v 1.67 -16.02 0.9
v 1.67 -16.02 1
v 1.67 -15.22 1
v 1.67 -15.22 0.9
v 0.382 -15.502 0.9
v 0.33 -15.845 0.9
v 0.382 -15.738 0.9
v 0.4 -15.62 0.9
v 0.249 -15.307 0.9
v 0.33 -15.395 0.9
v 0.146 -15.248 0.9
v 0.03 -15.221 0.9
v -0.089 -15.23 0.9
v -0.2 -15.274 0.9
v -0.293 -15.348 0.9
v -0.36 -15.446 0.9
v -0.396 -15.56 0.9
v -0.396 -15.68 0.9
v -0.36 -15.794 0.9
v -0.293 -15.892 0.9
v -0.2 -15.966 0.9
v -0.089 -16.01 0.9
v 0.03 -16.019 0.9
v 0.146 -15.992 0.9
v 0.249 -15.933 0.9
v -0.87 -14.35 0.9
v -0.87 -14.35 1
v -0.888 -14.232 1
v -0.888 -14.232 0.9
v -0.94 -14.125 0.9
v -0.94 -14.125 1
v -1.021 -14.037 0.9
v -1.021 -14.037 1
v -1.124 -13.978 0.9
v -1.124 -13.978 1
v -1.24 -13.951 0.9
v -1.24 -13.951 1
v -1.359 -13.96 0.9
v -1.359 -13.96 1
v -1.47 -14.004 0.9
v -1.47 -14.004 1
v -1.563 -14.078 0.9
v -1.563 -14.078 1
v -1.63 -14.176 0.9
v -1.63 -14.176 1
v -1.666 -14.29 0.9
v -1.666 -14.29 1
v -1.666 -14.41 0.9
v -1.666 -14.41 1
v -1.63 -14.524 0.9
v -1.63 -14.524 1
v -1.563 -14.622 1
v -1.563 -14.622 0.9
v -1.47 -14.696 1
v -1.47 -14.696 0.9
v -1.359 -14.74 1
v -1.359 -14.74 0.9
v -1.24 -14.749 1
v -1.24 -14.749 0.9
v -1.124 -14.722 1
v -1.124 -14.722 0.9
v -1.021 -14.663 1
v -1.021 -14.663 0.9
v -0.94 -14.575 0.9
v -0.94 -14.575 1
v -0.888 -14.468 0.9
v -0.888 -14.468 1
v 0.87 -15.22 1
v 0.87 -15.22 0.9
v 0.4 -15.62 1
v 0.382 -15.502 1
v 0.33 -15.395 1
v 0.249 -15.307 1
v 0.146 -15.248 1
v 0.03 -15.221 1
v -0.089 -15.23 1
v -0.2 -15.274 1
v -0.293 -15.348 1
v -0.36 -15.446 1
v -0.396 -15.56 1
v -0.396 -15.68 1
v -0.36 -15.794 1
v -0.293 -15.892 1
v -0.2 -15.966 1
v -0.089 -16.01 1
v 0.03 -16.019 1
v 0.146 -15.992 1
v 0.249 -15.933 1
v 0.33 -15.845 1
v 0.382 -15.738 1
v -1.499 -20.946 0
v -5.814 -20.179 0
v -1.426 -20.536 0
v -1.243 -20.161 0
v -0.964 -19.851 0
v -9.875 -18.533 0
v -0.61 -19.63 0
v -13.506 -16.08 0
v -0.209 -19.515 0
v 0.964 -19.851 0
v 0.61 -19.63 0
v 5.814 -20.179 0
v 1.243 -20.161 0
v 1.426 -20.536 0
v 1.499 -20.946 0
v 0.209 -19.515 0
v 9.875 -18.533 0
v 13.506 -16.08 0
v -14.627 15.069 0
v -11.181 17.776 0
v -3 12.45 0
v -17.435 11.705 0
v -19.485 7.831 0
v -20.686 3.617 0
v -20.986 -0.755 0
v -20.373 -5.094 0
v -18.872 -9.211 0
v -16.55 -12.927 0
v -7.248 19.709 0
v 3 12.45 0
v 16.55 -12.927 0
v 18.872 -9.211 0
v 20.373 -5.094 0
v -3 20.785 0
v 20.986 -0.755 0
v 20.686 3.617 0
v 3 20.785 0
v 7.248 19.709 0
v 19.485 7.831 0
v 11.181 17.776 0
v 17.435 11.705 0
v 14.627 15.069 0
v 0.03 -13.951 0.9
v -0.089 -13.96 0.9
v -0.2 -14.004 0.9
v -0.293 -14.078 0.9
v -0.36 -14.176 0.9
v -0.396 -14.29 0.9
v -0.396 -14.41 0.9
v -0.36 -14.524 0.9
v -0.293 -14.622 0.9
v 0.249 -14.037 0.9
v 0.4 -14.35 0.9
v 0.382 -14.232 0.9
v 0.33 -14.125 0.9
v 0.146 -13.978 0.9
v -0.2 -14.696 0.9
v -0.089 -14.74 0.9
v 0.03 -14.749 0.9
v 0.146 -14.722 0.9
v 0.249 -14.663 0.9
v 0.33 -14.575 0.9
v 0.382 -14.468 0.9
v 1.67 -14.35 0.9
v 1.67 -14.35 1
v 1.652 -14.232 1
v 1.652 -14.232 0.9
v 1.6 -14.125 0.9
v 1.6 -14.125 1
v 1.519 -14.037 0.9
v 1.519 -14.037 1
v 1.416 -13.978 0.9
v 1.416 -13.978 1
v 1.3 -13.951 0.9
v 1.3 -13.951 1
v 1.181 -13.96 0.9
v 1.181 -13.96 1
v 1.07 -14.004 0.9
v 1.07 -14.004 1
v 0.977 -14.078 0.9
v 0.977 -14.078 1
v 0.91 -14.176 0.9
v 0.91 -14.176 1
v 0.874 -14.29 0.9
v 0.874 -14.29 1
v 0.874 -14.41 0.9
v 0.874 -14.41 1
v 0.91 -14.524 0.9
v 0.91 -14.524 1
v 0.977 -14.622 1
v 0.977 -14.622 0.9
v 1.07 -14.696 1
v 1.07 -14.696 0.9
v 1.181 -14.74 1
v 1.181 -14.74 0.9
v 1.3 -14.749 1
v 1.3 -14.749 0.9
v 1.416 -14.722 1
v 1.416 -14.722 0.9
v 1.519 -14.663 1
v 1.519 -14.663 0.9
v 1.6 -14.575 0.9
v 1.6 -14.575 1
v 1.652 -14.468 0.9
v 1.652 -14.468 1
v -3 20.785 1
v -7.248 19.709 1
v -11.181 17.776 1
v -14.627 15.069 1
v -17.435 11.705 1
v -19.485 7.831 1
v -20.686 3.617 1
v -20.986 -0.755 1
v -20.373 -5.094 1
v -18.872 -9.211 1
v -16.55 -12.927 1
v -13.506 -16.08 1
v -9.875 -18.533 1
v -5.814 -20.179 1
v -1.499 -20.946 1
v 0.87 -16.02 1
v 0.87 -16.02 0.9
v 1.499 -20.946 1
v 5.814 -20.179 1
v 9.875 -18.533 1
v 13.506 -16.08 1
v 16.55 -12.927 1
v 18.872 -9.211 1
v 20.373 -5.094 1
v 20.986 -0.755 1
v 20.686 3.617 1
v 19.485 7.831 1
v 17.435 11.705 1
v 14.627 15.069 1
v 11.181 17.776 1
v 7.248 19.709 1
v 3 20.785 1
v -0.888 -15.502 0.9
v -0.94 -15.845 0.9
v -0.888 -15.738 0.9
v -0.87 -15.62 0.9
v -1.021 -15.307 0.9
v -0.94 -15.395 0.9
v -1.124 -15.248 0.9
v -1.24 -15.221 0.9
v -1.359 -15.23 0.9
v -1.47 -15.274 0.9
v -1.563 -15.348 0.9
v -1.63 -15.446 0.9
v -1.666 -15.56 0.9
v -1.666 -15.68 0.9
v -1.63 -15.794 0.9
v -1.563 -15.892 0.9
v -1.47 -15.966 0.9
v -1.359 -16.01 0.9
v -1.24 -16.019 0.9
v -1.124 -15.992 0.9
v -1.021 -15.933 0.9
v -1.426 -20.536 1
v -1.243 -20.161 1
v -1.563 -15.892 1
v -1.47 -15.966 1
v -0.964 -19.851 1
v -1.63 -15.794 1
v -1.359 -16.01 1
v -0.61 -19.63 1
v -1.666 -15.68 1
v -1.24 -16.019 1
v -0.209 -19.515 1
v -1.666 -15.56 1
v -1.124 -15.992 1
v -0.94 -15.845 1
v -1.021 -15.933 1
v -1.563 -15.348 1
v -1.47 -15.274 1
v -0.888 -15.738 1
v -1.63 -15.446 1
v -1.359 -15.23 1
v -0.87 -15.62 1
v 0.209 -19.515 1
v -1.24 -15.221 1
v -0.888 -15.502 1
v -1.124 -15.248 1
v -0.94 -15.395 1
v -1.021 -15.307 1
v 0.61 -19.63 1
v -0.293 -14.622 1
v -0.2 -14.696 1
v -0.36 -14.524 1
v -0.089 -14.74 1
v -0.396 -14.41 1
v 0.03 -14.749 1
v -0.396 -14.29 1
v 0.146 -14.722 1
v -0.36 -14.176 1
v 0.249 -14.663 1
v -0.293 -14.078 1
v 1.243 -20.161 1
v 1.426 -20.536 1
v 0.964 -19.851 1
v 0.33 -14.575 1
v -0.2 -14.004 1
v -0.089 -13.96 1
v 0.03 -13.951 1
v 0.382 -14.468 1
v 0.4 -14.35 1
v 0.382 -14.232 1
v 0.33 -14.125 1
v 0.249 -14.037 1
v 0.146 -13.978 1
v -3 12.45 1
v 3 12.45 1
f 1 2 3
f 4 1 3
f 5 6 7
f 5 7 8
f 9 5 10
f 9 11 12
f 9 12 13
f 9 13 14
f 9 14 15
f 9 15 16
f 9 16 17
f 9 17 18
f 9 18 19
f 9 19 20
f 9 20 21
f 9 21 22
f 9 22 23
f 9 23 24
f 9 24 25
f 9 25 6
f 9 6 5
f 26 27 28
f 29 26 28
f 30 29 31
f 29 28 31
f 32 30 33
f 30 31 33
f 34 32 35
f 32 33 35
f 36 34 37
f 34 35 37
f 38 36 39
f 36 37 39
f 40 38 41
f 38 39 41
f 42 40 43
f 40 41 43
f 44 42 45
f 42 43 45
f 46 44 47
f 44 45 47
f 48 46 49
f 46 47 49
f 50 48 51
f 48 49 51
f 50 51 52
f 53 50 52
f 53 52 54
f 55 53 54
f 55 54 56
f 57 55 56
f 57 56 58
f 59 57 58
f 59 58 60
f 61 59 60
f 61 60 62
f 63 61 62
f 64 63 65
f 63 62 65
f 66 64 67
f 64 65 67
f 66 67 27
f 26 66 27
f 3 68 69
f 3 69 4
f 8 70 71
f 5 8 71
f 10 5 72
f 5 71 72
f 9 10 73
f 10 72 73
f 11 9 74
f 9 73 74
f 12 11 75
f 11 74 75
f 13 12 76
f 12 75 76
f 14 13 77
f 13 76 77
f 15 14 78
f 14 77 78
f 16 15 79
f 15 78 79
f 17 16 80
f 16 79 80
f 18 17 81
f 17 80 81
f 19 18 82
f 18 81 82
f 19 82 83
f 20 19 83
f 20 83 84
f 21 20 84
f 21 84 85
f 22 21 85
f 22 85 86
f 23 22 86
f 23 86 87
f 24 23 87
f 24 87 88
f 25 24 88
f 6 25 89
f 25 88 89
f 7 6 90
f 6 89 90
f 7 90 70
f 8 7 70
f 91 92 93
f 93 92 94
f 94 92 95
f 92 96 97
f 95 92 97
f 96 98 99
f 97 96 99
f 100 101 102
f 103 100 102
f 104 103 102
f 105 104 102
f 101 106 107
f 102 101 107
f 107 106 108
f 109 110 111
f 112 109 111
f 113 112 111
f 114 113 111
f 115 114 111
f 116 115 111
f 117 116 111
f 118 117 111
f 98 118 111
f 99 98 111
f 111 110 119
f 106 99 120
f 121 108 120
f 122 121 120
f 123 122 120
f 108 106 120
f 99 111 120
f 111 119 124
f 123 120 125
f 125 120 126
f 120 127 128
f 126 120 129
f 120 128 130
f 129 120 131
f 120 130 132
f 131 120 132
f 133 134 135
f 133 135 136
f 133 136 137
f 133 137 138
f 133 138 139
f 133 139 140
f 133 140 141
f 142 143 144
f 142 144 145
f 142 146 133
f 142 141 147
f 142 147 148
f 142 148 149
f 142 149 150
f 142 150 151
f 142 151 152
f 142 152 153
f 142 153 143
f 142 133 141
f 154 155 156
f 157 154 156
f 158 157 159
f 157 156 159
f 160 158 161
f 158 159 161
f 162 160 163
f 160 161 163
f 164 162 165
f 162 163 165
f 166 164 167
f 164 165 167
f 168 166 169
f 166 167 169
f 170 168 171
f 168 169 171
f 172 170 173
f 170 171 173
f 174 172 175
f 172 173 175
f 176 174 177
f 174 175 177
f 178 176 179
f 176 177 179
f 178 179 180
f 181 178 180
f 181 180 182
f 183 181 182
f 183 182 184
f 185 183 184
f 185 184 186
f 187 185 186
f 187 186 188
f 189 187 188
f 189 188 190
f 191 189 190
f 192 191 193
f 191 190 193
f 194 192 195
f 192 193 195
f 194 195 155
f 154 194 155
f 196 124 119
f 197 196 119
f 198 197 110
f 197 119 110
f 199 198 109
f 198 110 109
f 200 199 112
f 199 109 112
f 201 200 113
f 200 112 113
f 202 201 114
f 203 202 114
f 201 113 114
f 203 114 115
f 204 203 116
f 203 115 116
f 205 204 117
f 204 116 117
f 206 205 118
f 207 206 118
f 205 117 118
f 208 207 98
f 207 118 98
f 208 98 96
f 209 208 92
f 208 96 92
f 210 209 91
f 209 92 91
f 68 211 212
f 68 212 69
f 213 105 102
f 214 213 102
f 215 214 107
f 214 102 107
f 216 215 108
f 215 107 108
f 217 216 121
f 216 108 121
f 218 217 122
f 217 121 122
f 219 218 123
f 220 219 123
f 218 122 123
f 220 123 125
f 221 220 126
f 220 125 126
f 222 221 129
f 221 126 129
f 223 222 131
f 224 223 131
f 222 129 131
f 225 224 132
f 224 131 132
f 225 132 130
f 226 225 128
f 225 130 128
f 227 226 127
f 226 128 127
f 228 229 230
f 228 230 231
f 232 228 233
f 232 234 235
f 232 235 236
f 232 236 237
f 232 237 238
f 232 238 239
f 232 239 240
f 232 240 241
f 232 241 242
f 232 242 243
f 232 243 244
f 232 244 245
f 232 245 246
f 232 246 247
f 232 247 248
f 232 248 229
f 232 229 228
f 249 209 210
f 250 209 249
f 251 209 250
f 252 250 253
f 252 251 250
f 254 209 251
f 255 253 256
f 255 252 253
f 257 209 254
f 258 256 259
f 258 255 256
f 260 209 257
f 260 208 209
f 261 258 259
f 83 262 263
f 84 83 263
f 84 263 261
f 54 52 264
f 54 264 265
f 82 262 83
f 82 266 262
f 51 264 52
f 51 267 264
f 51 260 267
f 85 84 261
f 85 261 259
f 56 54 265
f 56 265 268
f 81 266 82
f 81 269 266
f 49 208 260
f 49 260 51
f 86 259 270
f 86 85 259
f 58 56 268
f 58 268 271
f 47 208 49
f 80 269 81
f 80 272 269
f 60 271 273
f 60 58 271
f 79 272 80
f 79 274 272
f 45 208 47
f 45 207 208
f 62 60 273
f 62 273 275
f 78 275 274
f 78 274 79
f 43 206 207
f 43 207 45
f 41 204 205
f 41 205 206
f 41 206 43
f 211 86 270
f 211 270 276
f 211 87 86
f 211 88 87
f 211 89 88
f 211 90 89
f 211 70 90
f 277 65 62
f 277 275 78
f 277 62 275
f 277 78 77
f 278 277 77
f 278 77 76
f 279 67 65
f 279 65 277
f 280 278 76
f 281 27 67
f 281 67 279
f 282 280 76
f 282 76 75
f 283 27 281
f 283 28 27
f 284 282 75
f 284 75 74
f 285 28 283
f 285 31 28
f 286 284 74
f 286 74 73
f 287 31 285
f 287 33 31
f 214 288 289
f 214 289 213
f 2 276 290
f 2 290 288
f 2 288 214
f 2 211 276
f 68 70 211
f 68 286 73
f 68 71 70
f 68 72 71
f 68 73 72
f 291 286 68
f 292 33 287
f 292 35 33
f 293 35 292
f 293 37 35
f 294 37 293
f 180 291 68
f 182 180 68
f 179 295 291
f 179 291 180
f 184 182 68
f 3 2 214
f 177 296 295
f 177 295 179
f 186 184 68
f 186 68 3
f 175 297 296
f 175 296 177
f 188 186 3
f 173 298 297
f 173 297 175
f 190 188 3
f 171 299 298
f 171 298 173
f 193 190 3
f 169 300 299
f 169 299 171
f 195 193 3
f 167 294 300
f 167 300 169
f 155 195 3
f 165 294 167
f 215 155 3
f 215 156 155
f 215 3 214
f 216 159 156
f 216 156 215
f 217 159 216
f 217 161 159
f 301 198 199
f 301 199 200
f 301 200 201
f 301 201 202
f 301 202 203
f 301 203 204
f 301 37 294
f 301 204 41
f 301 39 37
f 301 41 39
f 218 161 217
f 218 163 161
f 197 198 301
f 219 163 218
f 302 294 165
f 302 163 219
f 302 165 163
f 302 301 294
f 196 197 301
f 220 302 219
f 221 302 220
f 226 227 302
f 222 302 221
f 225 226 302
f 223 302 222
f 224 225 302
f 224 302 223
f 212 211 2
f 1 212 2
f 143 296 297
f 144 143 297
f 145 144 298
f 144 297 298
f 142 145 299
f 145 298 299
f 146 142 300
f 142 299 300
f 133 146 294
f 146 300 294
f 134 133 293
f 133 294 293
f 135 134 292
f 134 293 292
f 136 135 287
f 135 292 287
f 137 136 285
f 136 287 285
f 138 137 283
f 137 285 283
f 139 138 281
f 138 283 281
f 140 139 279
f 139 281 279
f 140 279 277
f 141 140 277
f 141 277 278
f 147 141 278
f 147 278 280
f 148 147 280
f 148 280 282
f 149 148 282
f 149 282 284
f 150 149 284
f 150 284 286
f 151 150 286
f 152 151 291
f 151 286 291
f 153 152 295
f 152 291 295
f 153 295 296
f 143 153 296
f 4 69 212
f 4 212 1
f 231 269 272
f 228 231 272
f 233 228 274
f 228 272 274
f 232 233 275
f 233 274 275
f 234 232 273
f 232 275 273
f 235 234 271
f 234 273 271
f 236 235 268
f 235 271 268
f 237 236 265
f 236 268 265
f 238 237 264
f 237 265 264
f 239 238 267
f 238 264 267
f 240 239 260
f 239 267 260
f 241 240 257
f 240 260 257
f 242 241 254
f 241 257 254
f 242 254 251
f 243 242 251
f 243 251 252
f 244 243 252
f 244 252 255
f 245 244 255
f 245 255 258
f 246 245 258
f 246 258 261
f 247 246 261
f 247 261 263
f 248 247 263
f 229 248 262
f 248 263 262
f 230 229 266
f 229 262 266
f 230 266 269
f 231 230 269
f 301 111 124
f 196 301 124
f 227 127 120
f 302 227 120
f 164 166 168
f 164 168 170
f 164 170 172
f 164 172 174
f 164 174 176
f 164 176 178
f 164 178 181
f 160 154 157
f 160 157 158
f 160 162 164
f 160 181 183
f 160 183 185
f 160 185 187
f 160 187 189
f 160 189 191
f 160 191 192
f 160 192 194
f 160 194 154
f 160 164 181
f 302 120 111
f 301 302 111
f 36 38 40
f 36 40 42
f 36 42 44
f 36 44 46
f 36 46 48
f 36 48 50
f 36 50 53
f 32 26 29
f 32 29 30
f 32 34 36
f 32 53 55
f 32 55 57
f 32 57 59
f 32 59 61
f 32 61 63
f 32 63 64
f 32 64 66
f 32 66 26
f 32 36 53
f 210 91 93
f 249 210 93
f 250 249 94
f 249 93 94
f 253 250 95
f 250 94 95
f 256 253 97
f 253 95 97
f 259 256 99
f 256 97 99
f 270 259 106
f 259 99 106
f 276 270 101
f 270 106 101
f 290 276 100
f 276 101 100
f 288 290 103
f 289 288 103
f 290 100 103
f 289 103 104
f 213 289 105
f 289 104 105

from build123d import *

# Parameters (mm, degrees)
F1_DEPTH = 1
F3_R     = 0.4
F3_W     = 0.8
F3_H     = 0.8
F4_DEPTH = 0.1


with BuildPart() as f1:
    # F0 (on Top) → F1 (new body)
    with BuildSketch(Plane.XY):
        with BuildLine():
            ThreePointArc((-1.499043, -20.946429), (0, -19.5), (1.499043, -20.946429))
            ThreePointArc((1.499043, -20.946429), (20.98643, -0.754827), (3, 20.78461))
            Line((3, 20.78461), (3, 12.45))
            Line((3, 12.45), (-3, 12.45))
            Line((-3, 12.45), (-3, 20.78461))
            ThreePointArc((-3, 20.78461), (-20.98643, -0.754827), (-1.499043, -20.946429))
        make_face()
    extrude(amount=F1_DEPTH)

    # F3 (on face) → F4 (cut)
    with BuildSketch(Plane.XY.offset(1)):
        with Locations((0, -15.62)):
            Circle(F3_R)
        with Locations((-1.27, -15.62)):
            Circle(F3_R)
        with Locations((1.27, -14.35)):
            Circle(F3_R)
        with Locations((0, -14.35)):
            Circle(F3_R)
        with Locations((-1.27, -14.35)):
            Circle(F3_R)
        with Locations((1.27, -15.62)):
            Rectangle(F3_W, F3_H)
    extrude(amount=-F4_DEPTH, mode=Mode.SUBTRACT)


solid = f1.part
